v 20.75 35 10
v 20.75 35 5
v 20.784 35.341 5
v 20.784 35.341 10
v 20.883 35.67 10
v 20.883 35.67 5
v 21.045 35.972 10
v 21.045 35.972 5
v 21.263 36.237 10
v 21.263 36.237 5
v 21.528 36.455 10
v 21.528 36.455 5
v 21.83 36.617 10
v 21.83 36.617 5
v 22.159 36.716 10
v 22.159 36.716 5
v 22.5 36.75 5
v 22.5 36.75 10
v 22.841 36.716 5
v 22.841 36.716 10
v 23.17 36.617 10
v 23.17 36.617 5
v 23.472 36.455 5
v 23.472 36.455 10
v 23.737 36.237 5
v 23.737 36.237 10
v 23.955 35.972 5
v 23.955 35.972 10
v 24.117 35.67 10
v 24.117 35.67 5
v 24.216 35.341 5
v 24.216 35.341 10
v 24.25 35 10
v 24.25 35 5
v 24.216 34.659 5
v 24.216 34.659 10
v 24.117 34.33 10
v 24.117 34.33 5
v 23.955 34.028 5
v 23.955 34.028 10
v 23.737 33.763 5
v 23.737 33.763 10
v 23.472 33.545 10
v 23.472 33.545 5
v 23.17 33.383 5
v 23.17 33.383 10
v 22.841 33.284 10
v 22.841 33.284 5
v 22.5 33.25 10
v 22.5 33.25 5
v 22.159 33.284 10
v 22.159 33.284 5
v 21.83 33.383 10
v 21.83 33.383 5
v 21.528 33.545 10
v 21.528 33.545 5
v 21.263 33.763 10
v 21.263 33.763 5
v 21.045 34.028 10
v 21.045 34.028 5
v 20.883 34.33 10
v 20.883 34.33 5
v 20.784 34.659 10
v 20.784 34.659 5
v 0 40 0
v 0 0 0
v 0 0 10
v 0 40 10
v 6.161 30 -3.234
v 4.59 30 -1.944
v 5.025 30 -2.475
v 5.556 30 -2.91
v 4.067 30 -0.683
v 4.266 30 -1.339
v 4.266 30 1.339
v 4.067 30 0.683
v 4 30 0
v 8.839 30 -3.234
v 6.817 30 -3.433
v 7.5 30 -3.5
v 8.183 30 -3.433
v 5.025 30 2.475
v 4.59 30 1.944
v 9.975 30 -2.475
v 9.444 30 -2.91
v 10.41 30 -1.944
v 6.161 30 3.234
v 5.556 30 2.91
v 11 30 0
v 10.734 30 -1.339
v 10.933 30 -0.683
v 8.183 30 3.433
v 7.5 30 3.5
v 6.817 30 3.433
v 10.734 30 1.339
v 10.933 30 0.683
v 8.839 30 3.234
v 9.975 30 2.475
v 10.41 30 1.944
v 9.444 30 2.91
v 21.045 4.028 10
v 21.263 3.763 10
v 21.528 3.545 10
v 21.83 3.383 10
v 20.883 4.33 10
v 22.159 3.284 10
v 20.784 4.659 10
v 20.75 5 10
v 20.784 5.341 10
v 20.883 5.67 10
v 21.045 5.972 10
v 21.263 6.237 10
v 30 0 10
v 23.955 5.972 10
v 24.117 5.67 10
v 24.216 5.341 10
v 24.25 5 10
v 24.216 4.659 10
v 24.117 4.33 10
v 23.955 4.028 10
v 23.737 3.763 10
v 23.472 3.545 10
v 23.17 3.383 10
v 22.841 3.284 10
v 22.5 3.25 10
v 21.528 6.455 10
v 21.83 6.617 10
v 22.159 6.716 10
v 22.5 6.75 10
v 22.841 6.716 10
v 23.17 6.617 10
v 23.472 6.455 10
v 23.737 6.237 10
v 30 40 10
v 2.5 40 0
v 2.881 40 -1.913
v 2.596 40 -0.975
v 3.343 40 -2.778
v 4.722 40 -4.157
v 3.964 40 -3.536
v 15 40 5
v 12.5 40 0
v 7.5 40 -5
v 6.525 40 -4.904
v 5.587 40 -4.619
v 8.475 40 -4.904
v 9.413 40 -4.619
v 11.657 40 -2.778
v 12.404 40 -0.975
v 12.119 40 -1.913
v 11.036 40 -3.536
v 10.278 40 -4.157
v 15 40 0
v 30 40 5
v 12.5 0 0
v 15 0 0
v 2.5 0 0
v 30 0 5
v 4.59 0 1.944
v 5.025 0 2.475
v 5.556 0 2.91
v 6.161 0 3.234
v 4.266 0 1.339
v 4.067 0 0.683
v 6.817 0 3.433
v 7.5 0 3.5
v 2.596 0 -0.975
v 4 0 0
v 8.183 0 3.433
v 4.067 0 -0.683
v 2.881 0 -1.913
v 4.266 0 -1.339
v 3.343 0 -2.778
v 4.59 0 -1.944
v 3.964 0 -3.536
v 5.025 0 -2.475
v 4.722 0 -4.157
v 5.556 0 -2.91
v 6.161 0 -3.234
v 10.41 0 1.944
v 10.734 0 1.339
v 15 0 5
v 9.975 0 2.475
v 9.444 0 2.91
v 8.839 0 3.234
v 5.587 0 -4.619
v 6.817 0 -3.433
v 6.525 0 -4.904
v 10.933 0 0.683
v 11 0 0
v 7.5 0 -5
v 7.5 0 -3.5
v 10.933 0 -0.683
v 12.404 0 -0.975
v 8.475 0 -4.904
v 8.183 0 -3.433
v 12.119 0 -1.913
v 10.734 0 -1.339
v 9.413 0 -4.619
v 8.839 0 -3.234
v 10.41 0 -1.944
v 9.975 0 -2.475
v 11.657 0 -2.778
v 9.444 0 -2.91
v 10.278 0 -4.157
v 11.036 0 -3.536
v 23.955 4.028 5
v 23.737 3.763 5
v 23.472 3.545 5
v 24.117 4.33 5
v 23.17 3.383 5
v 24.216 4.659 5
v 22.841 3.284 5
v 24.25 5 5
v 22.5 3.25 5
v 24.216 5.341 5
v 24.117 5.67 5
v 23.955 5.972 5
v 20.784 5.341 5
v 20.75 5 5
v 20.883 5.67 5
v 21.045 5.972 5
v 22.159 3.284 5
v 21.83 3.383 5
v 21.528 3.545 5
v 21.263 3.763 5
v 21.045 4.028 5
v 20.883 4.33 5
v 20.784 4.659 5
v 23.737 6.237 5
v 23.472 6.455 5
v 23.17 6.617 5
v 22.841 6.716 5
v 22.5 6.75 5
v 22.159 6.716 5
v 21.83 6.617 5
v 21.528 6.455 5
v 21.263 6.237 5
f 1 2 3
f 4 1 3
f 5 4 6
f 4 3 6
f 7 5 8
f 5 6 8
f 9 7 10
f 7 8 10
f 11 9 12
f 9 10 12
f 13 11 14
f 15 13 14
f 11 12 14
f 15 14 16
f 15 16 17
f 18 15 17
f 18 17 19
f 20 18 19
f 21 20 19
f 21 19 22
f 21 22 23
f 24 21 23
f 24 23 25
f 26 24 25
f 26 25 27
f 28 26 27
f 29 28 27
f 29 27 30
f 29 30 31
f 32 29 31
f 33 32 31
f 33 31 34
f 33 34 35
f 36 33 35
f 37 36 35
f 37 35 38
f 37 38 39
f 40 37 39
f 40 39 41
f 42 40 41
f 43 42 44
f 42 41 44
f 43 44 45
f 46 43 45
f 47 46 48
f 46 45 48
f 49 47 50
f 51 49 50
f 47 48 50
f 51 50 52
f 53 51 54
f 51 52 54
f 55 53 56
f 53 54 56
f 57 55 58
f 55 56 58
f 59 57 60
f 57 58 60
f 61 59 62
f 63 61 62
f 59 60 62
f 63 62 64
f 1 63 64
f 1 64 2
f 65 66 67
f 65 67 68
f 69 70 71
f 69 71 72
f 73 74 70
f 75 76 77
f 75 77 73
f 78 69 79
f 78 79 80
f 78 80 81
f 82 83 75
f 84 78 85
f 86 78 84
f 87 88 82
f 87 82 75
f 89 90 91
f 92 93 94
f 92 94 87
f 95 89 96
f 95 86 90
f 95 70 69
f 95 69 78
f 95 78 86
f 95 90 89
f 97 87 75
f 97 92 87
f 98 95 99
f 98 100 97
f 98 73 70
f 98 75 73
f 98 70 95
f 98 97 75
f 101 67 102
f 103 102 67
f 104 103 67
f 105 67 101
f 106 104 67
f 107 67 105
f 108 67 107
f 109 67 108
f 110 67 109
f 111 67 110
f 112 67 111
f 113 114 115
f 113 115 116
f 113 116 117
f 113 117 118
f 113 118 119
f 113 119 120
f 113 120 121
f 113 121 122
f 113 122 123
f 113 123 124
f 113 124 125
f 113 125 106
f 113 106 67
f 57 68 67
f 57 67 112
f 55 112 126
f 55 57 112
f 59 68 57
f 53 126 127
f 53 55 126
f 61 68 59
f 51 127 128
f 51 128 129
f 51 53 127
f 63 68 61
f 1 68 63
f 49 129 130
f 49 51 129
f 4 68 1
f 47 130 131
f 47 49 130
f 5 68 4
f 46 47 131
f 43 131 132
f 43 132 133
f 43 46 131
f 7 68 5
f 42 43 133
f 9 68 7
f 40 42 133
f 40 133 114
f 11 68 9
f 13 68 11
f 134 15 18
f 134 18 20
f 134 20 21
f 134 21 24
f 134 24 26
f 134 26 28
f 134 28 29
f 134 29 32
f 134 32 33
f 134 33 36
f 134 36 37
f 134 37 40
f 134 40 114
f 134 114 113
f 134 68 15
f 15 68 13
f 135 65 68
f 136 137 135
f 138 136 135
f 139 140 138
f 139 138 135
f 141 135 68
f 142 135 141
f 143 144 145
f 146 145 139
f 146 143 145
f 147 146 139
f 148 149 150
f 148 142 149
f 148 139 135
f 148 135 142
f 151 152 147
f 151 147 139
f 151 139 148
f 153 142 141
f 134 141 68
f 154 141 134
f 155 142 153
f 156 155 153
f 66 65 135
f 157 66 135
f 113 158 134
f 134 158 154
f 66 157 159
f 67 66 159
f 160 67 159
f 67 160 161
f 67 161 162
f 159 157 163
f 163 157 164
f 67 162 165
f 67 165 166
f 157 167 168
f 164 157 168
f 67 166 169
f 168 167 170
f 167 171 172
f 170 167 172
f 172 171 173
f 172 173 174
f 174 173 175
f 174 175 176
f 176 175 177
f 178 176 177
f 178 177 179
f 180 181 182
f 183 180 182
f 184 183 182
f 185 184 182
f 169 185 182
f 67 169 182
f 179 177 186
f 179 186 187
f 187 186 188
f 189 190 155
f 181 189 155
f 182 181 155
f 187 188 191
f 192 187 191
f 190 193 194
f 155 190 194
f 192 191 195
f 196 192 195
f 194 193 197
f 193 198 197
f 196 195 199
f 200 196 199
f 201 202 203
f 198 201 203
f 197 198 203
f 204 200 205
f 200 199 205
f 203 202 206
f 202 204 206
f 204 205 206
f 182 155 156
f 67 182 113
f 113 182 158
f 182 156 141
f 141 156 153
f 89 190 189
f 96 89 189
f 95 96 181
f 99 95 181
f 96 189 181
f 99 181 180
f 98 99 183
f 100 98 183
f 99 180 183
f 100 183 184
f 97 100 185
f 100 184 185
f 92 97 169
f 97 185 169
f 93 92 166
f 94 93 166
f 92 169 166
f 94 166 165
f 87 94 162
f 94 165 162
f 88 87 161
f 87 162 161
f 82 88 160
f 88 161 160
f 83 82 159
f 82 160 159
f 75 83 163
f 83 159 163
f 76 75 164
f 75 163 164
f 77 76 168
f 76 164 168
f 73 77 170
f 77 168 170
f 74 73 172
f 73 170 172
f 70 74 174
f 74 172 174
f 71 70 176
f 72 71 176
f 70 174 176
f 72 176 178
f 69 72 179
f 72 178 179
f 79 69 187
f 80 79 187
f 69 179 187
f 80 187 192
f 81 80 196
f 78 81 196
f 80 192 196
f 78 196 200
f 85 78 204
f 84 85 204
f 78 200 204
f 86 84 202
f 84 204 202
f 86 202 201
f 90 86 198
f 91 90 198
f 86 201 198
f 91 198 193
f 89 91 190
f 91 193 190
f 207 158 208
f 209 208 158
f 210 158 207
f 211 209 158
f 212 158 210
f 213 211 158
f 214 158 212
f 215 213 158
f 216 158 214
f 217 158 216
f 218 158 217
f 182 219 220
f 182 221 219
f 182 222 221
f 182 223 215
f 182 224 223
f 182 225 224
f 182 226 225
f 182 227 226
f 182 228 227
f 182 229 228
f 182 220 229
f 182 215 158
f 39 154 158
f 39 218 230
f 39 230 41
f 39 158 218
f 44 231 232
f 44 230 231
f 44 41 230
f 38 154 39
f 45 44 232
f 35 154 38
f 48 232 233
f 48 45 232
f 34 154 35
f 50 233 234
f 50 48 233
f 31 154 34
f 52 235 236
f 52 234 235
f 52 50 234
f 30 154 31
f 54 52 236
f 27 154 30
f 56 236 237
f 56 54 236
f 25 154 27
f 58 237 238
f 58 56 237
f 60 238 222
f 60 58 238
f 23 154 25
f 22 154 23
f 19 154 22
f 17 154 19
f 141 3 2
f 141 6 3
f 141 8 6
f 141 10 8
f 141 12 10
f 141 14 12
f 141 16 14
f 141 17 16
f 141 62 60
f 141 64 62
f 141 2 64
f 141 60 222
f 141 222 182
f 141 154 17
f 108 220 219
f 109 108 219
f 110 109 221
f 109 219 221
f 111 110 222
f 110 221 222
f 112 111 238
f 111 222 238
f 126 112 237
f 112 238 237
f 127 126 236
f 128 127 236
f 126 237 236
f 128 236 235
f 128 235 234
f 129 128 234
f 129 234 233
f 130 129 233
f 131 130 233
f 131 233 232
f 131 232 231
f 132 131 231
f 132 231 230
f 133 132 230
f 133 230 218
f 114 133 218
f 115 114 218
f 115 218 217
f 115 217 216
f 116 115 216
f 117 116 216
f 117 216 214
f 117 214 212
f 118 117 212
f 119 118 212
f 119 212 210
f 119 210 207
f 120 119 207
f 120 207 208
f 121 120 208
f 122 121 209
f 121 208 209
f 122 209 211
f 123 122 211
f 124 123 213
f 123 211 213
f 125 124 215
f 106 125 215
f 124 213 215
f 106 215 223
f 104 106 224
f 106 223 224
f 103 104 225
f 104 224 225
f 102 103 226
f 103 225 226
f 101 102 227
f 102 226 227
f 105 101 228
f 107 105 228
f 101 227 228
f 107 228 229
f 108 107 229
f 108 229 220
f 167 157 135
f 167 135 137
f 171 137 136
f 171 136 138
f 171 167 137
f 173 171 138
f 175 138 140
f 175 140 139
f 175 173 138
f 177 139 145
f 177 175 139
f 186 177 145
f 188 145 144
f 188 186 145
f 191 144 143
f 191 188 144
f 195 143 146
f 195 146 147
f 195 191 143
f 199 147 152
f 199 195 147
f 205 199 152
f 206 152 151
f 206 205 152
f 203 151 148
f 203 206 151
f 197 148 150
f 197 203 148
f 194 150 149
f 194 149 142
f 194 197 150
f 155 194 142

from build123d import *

# Parameters (mm, degrees)
SKETCH1_W           = 30
SKETCH1_H           = 40
BOSS_EXTRUDE1_DEPTH = 10
SKETCH2_W           = 15
SKETCH2_H           = 40
CUT_EXTRUDE1_DEPTH  = 5
SKETCH4_R           = 1.75
CUT_EXTRUDE3_DEPTH  = 30
SKETCH7_R           = 5
BOSS_EXTRUDE2_DEPTH = 40
SKETCH8_R           = 3.5
CUT_EXTRUDE4_DEPTH  = 30


with BuildPart() as part:
    # Sketch1 → Boss-Extrude1 (new body)
    with BuildSketch(Plane.XY):
        with Locations((15, 20)):
            Rectangle(SKETCH1_W, SKETCH1_H)
    extrude(amount=BOSS_EXTRUDE1_DEPTH)

    # Sketch2 → Cut-Extrude1 (cut)
    with BuildSketch(Plane(origin=(0, 0, 0), x_dir=(-1, 0, 0), z_dir=(0, 0, -1))):
        with Locations((-22.5, 20)):
            Rectangle(SKETCH2_W, SKETCH2_H)
    extrude(amount=-CUT_EXTRUDE1_DEPTH, mode=Mode.SUBTRACT)

    # Sketch4 → Cut-Extrude3 (cut)
    with BuildSketch(Plane(origin=(0, 0, 5), x_dir=(-1, 0, 0), z_dir=(0, 0, -1))):
        with Locations((-22.5, 5)):
            Circle(SKETCH4_R)
        with Locations((-22.5, 35)):
            Circle(SKETCH4_R)
    extrude(amount=-CUT_EXTRUDE3_DEPTH, mode=Mode.SUBTRACT)

    # Sketch7 → Boss-Extrude2 (add)
    with BuildSketch(Plane.XZ):
        with Locations((7.5, 0)):
            Circle(SKETCH7_R)
    extrude(amount=-BOSS_EXTRUDE2_DEPTH)

    # Sketch8 → Cut-Extrude4 (cut)
    with BuildSketch(Plane.XZ):
        with Locations((7.5, 0)):
            Circle(SKETCH8_R)
    extrude(amount=-CUT_EXTRUDE4_DEPTH, mode=Mode.SUBTRACT)


solid = part.part
